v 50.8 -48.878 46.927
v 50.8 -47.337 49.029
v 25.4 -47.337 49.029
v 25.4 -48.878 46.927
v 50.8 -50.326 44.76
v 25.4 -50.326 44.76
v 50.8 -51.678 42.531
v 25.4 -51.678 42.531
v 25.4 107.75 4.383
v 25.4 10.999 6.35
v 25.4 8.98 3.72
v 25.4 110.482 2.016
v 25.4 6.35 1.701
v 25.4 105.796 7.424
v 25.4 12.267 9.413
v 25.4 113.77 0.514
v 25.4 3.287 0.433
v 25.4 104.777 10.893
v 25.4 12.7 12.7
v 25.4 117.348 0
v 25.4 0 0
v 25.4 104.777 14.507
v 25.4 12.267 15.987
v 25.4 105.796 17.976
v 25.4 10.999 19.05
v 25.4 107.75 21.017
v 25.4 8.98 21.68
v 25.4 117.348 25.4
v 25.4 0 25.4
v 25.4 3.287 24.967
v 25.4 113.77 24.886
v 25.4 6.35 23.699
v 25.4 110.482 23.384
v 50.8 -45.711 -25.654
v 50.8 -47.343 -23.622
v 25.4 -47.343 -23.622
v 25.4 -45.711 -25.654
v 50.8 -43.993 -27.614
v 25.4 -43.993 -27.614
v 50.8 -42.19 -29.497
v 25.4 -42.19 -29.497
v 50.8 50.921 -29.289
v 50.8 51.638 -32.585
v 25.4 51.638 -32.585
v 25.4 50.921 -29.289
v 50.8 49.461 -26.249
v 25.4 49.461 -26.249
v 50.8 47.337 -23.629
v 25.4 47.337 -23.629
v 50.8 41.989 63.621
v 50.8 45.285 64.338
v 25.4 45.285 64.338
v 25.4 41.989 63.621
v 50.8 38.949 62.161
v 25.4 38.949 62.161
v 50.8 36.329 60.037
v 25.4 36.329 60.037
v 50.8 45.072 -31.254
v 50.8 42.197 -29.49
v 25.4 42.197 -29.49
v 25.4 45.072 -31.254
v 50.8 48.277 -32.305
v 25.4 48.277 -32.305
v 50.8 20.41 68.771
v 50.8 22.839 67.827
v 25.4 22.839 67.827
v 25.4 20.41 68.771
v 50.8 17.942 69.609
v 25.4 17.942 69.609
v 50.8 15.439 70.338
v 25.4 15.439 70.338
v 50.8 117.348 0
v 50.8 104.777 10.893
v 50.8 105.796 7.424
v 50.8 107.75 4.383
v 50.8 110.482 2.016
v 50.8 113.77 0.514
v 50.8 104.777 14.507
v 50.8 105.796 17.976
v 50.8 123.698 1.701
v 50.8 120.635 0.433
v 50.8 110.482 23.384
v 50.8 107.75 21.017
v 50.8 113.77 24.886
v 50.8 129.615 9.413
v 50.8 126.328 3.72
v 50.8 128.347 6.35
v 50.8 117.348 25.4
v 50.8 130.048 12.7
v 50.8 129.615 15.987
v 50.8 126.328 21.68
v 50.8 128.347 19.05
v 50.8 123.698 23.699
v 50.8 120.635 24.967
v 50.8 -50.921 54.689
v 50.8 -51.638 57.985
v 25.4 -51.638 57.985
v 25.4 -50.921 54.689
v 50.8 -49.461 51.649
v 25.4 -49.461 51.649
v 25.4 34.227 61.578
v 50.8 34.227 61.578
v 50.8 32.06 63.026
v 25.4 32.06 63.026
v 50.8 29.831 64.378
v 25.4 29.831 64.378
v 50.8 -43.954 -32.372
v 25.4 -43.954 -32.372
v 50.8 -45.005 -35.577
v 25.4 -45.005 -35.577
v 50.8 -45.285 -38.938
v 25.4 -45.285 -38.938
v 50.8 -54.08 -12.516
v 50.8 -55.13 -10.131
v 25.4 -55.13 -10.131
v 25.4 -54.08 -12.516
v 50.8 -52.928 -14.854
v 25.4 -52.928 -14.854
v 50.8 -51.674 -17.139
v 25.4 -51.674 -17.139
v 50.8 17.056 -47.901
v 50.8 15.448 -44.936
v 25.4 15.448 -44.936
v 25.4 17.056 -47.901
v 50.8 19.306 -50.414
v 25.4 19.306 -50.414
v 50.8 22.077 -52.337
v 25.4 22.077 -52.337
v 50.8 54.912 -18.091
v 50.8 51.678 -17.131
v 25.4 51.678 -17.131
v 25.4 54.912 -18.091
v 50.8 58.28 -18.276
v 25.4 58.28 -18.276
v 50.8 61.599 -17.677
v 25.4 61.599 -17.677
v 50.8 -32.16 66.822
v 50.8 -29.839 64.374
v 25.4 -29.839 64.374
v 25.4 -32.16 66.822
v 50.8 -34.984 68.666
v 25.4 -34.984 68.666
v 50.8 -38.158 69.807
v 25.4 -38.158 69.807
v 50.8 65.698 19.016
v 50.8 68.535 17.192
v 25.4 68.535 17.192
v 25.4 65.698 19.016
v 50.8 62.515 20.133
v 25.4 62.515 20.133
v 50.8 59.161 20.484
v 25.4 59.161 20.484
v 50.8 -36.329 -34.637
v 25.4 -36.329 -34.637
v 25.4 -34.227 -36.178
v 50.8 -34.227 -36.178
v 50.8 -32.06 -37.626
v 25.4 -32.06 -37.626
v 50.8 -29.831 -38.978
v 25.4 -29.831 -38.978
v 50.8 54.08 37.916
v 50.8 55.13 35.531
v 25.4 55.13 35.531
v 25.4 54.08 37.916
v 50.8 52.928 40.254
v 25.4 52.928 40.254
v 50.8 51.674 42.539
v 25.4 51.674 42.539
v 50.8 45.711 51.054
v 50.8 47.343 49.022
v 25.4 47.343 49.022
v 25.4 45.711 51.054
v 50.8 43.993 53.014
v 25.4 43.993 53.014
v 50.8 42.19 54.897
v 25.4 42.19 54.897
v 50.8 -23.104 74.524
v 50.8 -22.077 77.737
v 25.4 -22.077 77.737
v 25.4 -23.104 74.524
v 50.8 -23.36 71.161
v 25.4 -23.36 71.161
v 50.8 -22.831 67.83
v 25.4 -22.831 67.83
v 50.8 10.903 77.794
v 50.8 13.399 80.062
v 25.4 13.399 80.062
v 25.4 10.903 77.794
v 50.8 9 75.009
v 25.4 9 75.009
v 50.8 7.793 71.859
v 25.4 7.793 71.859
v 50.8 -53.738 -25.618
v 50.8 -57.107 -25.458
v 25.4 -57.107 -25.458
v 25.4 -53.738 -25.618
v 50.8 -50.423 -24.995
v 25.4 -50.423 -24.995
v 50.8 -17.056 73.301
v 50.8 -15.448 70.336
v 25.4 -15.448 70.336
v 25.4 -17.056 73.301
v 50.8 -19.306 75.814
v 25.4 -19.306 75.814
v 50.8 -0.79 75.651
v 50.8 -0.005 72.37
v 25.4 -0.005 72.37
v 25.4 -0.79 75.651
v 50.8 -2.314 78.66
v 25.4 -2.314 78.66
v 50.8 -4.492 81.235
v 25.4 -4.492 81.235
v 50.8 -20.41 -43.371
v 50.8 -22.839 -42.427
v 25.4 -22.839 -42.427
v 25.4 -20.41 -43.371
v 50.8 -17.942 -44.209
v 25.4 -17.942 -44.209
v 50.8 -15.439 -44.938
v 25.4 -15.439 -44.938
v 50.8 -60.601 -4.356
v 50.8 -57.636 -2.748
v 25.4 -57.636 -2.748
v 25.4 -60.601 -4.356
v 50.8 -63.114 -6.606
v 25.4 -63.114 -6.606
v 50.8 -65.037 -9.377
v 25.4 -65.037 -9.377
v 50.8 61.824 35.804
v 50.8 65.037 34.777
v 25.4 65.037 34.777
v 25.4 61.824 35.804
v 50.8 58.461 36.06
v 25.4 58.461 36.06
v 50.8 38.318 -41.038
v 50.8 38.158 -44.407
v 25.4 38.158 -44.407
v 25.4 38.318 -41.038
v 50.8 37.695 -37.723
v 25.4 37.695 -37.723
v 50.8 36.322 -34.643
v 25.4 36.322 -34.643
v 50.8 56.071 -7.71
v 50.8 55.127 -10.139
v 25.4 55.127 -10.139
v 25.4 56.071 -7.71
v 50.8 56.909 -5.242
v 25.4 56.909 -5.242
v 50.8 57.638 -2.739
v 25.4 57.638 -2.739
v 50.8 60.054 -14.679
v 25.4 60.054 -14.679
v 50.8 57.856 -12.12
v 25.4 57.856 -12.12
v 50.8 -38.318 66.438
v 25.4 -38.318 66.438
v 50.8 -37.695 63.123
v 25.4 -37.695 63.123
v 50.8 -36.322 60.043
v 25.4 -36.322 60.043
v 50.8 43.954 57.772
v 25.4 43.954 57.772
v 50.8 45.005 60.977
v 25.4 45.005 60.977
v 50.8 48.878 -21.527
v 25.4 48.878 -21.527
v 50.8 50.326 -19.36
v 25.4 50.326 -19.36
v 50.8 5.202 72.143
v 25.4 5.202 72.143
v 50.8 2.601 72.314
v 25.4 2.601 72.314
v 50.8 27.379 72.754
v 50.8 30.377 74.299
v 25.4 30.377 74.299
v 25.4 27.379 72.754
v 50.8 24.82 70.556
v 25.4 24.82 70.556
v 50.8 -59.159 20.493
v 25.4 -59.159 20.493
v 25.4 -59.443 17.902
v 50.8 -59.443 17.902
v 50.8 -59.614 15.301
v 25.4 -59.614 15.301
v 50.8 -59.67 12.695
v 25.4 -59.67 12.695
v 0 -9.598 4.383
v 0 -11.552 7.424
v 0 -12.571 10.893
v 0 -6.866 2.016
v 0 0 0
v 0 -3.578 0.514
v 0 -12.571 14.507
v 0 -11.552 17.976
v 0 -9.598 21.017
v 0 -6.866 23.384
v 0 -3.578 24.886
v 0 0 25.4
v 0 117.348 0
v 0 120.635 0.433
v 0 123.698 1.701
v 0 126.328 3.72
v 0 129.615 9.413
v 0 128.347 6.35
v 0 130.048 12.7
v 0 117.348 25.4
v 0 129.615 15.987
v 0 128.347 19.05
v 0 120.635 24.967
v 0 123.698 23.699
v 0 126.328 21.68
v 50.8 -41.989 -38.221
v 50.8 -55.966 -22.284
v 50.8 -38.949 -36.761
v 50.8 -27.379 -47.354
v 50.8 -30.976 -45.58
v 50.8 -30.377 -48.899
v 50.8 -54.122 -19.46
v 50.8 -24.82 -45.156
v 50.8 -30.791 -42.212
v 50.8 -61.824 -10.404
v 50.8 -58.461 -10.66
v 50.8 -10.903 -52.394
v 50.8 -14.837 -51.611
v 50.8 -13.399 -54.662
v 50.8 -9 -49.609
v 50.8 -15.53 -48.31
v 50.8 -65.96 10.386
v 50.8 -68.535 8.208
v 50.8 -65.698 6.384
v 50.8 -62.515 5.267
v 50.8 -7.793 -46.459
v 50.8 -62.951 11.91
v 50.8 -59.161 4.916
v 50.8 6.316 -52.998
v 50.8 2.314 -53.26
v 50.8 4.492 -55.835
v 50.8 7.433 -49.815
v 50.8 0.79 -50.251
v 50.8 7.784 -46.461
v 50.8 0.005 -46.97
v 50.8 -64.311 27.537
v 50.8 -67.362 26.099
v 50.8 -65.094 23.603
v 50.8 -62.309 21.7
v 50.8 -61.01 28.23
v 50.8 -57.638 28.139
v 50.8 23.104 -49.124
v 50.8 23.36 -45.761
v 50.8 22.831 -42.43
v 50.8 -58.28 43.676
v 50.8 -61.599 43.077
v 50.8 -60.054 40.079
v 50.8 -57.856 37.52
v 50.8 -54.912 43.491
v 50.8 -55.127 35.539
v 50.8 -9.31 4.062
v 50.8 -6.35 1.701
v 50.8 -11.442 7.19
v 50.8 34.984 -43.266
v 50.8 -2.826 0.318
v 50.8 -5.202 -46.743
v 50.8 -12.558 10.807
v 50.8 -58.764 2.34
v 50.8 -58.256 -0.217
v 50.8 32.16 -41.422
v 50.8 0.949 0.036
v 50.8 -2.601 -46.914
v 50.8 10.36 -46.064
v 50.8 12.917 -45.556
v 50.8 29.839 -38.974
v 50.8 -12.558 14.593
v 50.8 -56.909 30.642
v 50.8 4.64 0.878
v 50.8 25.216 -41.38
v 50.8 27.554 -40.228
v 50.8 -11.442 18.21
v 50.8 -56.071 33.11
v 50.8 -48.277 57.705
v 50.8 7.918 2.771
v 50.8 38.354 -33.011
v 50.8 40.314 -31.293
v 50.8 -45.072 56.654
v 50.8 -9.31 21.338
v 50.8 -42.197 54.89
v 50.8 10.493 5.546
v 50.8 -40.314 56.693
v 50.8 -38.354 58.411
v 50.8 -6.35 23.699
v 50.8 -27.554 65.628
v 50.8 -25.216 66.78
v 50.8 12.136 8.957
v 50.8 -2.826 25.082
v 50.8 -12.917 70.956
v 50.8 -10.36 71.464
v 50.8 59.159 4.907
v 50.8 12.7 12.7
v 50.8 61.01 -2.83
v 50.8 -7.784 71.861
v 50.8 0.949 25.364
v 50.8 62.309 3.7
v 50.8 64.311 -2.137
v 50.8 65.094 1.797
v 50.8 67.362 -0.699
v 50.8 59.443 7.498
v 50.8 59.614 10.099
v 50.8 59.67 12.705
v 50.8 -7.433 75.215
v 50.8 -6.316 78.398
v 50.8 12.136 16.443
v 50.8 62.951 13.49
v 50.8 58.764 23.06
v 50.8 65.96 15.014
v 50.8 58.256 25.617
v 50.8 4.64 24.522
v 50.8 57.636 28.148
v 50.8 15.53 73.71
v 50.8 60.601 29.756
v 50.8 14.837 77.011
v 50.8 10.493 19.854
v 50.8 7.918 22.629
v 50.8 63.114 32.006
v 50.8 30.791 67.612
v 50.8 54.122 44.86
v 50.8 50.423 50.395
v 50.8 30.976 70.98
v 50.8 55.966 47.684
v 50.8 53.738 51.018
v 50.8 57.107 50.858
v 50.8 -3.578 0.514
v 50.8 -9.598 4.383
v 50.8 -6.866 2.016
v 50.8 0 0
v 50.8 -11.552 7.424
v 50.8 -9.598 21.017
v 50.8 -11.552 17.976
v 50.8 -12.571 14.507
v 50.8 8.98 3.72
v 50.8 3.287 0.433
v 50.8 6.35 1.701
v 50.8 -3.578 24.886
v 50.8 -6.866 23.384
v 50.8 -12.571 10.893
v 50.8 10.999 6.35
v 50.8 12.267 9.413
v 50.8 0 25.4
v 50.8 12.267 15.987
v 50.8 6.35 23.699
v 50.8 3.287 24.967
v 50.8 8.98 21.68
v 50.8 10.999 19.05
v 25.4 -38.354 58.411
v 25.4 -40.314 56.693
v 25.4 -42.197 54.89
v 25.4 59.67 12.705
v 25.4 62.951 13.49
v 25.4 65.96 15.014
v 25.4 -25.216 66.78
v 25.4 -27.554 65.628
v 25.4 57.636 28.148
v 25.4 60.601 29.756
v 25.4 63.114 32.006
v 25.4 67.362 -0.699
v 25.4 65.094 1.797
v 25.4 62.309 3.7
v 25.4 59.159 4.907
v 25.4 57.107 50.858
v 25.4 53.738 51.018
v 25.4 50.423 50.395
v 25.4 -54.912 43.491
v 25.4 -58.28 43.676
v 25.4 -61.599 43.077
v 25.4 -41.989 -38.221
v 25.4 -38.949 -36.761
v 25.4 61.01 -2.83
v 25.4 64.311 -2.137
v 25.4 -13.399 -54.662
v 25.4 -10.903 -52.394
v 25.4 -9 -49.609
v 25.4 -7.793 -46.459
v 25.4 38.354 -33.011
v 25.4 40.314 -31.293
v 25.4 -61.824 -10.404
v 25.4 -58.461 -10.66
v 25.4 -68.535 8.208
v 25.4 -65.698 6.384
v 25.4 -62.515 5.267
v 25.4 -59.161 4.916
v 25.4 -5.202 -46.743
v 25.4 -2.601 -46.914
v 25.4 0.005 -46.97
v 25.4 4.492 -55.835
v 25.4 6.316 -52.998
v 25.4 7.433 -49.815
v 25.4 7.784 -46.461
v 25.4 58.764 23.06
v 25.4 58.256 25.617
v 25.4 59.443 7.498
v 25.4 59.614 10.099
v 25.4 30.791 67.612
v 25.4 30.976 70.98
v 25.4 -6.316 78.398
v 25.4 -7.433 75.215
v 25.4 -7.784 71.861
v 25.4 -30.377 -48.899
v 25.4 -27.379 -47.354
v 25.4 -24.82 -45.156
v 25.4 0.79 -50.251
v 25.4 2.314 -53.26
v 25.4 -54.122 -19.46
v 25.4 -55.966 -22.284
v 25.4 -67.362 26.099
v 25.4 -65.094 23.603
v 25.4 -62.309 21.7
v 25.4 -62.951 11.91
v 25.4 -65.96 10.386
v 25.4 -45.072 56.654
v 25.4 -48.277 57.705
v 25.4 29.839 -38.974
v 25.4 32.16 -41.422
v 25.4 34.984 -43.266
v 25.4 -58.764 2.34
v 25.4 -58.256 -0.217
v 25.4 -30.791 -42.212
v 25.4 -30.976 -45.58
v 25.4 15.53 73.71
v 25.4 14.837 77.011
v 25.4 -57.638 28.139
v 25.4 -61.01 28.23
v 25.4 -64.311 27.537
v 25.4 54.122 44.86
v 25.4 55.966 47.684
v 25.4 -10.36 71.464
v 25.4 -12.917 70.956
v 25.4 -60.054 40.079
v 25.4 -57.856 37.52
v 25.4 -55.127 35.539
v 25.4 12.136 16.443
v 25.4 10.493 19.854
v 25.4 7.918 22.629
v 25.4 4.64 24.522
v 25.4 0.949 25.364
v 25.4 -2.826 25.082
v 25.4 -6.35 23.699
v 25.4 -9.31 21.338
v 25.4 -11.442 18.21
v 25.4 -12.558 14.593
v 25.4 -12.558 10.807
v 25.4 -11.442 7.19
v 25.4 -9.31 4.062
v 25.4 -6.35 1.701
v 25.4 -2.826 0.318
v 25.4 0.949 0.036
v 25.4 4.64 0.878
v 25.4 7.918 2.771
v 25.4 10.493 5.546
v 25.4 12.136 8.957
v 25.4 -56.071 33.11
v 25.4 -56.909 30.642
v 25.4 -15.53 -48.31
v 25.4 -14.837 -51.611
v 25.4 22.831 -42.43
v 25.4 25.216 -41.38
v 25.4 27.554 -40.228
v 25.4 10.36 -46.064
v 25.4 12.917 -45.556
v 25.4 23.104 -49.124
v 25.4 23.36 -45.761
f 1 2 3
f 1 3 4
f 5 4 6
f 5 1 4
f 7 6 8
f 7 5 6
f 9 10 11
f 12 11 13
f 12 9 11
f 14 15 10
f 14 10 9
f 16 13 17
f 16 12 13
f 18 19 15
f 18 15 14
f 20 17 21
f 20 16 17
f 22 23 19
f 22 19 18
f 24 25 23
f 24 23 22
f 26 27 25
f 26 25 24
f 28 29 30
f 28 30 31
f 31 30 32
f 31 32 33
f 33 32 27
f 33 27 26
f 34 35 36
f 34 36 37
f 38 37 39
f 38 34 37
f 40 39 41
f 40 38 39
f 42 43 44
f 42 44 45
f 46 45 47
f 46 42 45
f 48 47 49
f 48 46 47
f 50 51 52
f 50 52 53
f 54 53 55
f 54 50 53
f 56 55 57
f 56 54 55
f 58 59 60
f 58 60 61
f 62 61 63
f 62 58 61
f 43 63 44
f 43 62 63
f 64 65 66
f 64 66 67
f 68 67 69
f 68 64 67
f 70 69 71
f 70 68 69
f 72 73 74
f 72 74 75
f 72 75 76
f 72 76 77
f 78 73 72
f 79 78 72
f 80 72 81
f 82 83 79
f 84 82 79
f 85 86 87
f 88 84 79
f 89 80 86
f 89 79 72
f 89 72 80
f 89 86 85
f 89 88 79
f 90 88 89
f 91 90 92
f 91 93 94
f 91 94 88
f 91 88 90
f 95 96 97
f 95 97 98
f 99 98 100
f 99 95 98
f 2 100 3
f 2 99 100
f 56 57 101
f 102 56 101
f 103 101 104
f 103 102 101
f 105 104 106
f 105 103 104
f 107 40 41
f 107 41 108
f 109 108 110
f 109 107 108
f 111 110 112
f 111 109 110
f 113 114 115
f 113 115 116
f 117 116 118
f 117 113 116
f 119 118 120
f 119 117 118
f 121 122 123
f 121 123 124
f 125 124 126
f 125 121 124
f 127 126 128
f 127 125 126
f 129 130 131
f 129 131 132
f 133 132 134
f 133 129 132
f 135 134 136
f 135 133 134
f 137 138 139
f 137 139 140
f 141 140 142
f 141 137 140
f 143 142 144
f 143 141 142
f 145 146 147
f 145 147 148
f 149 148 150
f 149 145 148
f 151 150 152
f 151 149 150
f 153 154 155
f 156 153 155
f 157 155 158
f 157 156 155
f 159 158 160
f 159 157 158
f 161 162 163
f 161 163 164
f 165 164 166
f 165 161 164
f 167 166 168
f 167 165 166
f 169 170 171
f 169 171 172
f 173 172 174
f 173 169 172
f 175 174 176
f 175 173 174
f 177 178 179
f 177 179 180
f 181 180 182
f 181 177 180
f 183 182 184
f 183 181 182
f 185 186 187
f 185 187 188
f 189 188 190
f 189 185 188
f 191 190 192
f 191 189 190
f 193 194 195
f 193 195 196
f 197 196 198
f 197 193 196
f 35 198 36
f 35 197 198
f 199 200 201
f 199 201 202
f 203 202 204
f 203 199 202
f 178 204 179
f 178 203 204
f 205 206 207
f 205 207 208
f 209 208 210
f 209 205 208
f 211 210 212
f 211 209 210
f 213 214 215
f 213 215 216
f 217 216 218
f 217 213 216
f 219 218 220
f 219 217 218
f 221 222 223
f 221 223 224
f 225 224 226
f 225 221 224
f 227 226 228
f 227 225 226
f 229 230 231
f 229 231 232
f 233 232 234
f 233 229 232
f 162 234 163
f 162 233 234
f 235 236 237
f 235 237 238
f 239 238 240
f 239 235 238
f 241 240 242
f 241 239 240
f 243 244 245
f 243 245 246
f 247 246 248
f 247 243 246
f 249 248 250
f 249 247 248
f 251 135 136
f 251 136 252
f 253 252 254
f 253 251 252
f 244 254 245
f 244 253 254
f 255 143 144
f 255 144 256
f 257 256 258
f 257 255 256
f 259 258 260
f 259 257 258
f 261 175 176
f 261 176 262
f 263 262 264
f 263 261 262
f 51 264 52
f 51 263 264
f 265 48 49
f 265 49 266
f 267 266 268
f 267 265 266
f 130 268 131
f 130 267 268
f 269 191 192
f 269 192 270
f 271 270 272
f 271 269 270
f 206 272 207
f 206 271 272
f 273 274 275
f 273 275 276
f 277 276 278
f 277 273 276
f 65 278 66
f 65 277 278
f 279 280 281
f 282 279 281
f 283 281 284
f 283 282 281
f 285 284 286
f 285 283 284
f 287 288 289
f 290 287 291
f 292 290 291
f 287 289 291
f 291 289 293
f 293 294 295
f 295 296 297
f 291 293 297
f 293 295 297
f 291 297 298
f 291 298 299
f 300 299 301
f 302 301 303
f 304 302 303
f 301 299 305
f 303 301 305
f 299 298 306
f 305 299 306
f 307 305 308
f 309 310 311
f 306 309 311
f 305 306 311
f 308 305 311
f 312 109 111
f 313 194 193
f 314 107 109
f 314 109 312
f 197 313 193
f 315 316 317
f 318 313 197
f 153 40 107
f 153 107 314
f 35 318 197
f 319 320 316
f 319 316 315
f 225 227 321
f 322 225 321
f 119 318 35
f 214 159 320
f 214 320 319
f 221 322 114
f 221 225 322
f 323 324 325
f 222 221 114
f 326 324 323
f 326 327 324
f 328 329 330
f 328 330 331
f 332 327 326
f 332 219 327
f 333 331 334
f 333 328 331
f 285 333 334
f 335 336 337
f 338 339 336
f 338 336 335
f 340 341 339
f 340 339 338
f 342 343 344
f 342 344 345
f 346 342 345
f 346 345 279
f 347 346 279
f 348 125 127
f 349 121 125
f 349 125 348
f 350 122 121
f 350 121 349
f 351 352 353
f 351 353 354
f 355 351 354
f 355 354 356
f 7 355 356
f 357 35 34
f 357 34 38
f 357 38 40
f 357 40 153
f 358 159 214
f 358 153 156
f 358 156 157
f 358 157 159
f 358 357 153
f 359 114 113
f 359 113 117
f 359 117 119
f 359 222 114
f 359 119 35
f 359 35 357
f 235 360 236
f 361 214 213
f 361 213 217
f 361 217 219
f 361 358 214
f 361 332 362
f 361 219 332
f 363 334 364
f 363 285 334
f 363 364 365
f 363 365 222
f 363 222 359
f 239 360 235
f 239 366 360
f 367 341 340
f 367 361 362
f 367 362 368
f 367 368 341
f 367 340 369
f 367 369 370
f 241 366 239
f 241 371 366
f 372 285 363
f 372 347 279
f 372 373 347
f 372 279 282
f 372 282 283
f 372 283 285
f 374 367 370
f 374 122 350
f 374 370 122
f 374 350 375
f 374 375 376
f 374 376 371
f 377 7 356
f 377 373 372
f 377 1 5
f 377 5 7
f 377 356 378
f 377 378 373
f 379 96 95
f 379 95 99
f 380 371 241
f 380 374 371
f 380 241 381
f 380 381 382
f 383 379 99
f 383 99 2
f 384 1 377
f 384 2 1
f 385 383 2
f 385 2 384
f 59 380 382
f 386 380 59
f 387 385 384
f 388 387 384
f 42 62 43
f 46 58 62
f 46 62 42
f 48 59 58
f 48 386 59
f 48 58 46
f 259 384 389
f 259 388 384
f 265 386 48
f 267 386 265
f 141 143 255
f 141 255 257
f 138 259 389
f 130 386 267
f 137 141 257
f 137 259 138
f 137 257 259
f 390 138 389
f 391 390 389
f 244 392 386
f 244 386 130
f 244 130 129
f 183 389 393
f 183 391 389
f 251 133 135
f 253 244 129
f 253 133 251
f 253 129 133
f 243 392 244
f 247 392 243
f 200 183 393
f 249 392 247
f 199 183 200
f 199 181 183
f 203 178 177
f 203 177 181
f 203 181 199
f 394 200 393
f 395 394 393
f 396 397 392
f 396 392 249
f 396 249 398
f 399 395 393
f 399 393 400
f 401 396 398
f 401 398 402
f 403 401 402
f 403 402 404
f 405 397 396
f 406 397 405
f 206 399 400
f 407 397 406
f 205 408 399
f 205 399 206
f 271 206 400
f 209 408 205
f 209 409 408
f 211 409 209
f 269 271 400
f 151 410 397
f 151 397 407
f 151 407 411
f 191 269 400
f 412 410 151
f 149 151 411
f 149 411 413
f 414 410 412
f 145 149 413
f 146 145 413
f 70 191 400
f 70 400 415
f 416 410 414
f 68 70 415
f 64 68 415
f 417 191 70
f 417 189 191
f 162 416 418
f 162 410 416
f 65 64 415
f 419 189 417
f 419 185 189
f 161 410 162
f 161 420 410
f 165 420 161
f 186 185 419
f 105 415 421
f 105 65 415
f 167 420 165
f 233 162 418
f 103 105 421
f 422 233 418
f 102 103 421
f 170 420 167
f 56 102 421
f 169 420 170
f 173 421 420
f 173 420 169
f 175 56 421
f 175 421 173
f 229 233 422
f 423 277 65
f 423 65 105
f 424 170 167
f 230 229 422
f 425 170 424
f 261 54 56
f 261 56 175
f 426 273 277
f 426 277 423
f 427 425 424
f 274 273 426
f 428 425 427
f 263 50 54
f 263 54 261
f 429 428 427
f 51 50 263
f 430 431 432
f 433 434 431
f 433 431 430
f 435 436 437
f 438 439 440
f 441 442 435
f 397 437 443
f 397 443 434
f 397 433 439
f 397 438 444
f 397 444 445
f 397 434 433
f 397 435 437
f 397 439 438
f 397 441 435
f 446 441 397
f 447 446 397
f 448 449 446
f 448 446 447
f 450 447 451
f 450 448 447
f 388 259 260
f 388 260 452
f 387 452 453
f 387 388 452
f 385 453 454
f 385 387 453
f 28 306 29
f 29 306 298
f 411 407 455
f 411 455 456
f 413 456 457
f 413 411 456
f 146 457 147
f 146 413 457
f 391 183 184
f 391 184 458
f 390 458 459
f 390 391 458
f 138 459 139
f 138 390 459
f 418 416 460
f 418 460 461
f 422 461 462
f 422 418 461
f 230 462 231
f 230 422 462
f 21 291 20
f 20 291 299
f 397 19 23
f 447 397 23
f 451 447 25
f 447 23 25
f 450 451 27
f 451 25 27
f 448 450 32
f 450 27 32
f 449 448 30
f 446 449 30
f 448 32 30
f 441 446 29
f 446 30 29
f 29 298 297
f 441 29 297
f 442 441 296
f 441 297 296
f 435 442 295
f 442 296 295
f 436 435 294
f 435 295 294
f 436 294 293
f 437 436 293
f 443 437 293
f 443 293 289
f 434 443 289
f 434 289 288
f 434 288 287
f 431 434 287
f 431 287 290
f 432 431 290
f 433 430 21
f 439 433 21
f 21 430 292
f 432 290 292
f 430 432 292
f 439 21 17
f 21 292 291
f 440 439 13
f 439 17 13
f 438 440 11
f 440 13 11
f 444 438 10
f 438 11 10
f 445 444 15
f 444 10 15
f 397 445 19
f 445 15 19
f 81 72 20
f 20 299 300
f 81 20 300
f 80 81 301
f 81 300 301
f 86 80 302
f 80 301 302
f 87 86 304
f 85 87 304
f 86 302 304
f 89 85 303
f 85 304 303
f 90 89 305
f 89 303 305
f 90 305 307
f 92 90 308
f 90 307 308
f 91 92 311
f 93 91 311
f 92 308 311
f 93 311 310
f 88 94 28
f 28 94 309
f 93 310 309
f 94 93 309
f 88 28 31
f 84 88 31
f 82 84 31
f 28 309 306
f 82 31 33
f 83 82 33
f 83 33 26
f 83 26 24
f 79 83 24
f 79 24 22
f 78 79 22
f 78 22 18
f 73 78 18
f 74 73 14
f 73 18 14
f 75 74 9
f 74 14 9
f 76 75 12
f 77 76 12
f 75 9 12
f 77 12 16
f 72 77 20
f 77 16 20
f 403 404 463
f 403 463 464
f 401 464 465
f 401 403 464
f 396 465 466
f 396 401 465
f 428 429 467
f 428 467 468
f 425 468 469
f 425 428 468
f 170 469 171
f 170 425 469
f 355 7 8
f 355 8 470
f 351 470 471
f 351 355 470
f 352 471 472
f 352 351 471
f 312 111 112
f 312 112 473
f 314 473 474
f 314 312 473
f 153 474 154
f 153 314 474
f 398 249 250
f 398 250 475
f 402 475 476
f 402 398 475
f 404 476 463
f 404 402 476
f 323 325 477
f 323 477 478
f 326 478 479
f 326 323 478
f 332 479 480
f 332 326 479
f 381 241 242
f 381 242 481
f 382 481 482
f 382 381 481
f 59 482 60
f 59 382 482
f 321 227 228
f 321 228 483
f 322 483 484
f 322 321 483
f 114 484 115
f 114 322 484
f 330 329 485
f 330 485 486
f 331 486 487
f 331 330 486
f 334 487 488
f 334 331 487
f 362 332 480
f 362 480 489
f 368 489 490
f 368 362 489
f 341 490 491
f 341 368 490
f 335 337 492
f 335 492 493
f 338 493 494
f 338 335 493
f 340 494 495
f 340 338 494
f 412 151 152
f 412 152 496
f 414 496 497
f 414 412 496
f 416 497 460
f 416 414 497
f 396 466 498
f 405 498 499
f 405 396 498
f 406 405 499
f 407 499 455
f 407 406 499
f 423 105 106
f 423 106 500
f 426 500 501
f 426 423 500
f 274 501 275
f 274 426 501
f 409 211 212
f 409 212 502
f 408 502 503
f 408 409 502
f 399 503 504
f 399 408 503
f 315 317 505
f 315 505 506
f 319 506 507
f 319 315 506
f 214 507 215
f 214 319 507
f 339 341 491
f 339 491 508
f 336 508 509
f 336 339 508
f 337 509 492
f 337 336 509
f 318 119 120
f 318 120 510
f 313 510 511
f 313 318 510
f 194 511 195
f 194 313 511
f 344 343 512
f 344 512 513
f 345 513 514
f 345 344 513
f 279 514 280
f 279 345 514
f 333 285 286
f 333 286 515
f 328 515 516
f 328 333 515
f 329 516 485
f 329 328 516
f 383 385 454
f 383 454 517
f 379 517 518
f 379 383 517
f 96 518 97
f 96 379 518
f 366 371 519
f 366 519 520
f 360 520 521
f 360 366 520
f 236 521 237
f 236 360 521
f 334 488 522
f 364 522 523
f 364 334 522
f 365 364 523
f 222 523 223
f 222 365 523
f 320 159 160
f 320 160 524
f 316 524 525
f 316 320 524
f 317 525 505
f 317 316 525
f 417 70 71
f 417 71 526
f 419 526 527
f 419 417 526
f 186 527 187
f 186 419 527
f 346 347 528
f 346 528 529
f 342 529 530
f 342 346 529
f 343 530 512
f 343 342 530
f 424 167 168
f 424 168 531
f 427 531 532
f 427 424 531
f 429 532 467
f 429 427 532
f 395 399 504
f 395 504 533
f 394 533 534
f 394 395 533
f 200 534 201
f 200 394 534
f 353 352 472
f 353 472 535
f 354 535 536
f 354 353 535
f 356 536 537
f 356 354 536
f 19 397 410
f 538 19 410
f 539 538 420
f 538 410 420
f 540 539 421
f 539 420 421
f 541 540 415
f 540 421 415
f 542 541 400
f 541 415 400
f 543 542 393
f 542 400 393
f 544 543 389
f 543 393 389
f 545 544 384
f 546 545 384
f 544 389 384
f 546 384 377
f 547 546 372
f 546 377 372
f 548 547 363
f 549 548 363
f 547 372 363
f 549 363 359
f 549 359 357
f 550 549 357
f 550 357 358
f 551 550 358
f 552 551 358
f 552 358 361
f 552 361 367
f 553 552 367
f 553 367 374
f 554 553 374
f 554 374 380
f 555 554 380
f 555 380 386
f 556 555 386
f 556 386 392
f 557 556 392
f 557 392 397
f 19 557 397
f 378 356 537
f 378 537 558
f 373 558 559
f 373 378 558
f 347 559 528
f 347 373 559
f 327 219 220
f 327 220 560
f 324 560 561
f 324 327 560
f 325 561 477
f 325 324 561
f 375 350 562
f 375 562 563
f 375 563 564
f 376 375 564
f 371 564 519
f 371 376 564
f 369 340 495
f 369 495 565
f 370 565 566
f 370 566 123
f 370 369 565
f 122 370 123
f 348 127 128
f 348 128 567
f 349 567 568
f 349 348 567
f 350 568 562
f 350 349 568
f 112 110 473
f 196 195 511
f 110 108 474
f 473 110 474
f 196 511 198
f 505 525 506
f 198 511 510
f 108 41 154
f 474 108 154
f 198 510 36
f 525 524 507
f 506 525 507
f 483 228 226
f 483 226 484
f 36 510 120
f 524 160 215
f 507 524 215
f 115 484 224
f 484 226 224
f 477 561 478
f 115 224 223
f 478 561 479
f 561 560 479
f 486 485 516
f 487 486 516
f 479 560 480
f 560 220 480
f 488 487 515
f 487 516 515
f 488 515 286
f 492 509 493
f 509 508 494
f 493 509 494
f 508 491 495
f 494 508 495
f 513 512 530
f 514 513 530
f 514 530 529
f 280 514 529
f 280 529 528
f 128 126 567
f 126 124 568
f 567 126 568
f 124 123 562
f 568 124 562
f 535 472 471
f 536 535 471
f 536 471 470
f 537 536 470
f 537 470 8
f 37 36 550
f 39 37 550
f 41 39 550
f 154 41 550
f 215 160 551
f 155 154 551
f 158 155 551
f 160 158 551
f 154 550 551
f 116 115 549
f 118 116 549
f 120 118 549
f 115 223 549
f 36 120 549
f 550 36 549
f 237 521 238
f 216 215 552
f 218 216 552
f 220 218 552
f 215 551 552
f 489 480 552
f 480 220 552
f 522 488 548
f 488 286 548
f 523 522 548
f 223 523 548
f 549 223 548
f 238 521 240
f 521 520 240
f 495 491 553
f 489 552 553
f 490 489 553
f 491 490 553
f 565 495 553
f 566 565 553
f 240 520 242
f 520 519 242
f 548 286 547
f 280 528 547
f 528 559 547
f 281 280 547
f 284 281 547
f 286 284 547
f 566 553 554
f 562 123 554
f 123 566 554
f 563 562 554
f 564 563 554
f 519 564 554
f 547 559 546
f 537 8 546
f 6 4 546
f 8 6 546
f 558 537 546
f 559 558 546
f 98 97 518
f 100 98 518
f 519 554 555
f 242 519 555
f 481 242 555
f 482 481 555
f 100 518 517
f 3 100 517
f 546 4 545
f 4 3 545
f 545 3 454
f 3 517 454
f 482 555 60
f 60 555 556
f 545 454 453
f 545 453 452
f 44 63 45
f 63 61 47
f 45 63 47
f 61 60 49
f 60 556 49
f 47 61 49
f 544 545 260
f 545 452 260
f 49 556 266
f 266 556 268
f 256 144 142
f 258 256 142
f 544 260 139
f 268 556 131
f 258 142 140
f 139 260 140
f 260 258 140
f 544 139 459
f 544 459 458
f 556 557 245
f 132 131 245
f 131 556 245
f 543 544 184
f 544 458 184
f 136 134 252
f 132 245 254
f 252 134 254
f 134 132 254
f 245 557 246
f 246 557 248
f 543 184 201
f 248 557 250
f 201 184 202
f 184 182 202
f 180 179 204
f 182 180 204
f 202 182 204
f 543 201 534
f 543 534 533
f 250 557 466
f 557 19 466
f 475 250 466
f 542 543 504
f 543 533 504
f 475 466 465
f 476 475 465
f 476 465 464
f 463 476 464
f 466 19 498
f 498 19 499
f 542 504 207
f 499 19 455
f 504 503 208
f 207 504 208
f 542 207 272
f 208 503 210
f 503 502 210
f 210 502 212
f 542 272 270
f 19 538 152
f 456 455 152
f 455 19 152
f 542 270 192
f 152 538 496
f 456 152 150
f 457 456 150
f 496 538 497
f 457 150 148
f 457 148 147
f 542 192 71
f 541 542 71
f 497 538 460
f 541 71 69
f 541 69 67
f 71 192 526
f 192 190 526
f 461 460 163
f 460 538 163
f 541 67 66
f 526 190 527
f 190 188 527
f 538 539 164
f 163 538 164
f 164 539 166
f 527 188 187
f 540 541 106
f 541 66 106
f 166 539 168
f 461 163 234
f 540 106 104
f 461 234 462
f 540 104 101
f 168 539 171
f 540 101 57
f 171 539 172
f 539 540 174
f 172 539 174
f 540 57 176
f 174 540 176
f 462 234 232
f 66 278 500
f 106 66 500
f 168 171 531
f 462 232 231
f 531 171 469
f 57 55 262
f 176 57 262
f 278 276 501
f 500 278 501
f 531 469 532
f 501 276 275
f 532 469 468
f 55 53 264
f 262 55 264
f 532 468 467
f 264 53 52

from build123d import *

# Parameters (mm, degrees)
F1_DEPTH = 25.4
F2_DEPTH = 50.8
F3_R     = 12.7
F4_DEPTH = 25.4
F5_COUNT = 24
F5_ANGLE = 345


with BuildPart() as f1:
    # F0 (on Right) → F1 (new body)
    with BuildSketch(Plane.YZ):
        with BuildLine():
            ThreePointArc((12.7, 12.7), (8.9802561211, 3.7197438789), (0, 0))
            Line((0, 0), (117.348, 0))
            ThreePointArc((117.348, 0), (104.648, 12.7), (117.348, 25.4))
            Line((117.348, 25.4), (0, 25.4))
            ThreePointArc((0, 25.4), (8.9802561211, 21.6802561211), (12.7, 12.7))
        make_face()
        with BuildLine():
            ThreePointArc((0, 25.4), (-12.7, 12.7), (0, 0))
            Line((0, 0), (0, 25.4))
        make_face()
        with BuildLine():
            Line((0, 25.4), (0, 0))
            ThreePointArc((0, 0), (8.9802561211, 3.7197438789), (12.7, 12.7))
            ThreePointArc((12.7, 12.7), (8.9802561211, 21.6802561211), (0, 25.4))
        make_face()
        with BuildLine():
            ThreePointArc((117.348, 25.4), (104.648, 12.7), (117.348, 0))
            Line((117.348, 0), (117.348, 25.4))
        make_face()
        with BuildLine():
            Line((117.348, 25.4), (117.348, 0))
            ThreePointArc((117.348, 0), (126.3282561211, 3.7197438789), (130.048, 12.7))
            ThreePointArc((130.048, 12.7), (126.3282561211, 21.6802561211), (117.348, 25.4))
        make_face()
    extrude(amount=F1_DEPTH)

    # F0 (on Right) → F2 (join)
    with BuildSketch(Plane.YZ):
        with BuildLine():
            ThreePointArc((0, 25.4), (-12.7, 12.7), (0, 0))
            Line((0, 0), (0, 25.4))
        make_face()
        with BuildLine():
            Line((0, 25.4), (0, 0))
            ThreePointArc((0, 0), (8.9802561211, 3.7197438789), (12.7, 12.7))
            ThreePointArc((12.7, 12.7), (8.9802561211, 21.6802561211), (0, 25.4))
        make_face()
        with BuildLine():
            Line((117.348, 25.4), (117.348, 0))
            ThreePointArc((117.348, 0), (126.3282561211, 3.7197438789), (130.048, 12.7))
            ThreePointArc((130.048, 12.7), (126.3282561211, 21.6802561211), (117.348, 25.4))
        make_face()
        with BuildLine():
            ThreePointArc((117.348, 25.4), (104.648, 12.7), (117.348, 0))
            Line((117.348, 0), (117.348, 25.4))
        make_face()
    extrude(amount=F2_DEPTH)


with BuildPart() as f4:
    # F3 (on face) → F4 (new body)
    with BuildSketch(Plane.YZ.offset(50.8)):
        with BuildLine():
            ThreePointArc((-7.7840813249, 71.8605817315), (-39.3451805995, -32.1611537578), (59.6704814199, 12.7))
            ThreePointArc((59.6704814199, 12.7), (42.1918046526, 54.8949993843), (-0.0045180328, 72.3704812489))
            ThreePointArc((-0.0045180328, 72.3704812489), (-3.9026362075, 72.2427223388), (-7.7840813249, 71.8605817315))
        make_face()
        with Locations((0, 12.7)):
            Circle(F3_R, mode=Mode.SUBTRACT)
        with BuildLine():
            ThreePointArc((-7.7840813249, 71.8605817315), (-3.9026362075, 72.2427223388), (-0.0045180328, 72.3704812489))
            ThreePointArc((-0.0045180328, 72.3704812489), (-1.463981414, 77.1998216133), (-4.492027974, 81.2351029848))
            ThreePointArc((-4.492027974, 81.2351029848), (-6.967459264, 76.8391046175), (-7.7840813249, 71.8605817315))
        make_face()
    extrude(amount=-F4_DEPTH)

    # F5: F4 ×24 about axis
    f5_axis = Axis((50.8, 0, 12.7), (1, 0, 0))


with BuildPart() as f4_1:
    add(f4.part)
    for i in range(1, F5_COUNT):
        add(f4.part.rotate(f5_axis, i * F5_ANGLE / (F5_COUNT - 1)))


solid = Compound([f1.part, f4_1.part])
